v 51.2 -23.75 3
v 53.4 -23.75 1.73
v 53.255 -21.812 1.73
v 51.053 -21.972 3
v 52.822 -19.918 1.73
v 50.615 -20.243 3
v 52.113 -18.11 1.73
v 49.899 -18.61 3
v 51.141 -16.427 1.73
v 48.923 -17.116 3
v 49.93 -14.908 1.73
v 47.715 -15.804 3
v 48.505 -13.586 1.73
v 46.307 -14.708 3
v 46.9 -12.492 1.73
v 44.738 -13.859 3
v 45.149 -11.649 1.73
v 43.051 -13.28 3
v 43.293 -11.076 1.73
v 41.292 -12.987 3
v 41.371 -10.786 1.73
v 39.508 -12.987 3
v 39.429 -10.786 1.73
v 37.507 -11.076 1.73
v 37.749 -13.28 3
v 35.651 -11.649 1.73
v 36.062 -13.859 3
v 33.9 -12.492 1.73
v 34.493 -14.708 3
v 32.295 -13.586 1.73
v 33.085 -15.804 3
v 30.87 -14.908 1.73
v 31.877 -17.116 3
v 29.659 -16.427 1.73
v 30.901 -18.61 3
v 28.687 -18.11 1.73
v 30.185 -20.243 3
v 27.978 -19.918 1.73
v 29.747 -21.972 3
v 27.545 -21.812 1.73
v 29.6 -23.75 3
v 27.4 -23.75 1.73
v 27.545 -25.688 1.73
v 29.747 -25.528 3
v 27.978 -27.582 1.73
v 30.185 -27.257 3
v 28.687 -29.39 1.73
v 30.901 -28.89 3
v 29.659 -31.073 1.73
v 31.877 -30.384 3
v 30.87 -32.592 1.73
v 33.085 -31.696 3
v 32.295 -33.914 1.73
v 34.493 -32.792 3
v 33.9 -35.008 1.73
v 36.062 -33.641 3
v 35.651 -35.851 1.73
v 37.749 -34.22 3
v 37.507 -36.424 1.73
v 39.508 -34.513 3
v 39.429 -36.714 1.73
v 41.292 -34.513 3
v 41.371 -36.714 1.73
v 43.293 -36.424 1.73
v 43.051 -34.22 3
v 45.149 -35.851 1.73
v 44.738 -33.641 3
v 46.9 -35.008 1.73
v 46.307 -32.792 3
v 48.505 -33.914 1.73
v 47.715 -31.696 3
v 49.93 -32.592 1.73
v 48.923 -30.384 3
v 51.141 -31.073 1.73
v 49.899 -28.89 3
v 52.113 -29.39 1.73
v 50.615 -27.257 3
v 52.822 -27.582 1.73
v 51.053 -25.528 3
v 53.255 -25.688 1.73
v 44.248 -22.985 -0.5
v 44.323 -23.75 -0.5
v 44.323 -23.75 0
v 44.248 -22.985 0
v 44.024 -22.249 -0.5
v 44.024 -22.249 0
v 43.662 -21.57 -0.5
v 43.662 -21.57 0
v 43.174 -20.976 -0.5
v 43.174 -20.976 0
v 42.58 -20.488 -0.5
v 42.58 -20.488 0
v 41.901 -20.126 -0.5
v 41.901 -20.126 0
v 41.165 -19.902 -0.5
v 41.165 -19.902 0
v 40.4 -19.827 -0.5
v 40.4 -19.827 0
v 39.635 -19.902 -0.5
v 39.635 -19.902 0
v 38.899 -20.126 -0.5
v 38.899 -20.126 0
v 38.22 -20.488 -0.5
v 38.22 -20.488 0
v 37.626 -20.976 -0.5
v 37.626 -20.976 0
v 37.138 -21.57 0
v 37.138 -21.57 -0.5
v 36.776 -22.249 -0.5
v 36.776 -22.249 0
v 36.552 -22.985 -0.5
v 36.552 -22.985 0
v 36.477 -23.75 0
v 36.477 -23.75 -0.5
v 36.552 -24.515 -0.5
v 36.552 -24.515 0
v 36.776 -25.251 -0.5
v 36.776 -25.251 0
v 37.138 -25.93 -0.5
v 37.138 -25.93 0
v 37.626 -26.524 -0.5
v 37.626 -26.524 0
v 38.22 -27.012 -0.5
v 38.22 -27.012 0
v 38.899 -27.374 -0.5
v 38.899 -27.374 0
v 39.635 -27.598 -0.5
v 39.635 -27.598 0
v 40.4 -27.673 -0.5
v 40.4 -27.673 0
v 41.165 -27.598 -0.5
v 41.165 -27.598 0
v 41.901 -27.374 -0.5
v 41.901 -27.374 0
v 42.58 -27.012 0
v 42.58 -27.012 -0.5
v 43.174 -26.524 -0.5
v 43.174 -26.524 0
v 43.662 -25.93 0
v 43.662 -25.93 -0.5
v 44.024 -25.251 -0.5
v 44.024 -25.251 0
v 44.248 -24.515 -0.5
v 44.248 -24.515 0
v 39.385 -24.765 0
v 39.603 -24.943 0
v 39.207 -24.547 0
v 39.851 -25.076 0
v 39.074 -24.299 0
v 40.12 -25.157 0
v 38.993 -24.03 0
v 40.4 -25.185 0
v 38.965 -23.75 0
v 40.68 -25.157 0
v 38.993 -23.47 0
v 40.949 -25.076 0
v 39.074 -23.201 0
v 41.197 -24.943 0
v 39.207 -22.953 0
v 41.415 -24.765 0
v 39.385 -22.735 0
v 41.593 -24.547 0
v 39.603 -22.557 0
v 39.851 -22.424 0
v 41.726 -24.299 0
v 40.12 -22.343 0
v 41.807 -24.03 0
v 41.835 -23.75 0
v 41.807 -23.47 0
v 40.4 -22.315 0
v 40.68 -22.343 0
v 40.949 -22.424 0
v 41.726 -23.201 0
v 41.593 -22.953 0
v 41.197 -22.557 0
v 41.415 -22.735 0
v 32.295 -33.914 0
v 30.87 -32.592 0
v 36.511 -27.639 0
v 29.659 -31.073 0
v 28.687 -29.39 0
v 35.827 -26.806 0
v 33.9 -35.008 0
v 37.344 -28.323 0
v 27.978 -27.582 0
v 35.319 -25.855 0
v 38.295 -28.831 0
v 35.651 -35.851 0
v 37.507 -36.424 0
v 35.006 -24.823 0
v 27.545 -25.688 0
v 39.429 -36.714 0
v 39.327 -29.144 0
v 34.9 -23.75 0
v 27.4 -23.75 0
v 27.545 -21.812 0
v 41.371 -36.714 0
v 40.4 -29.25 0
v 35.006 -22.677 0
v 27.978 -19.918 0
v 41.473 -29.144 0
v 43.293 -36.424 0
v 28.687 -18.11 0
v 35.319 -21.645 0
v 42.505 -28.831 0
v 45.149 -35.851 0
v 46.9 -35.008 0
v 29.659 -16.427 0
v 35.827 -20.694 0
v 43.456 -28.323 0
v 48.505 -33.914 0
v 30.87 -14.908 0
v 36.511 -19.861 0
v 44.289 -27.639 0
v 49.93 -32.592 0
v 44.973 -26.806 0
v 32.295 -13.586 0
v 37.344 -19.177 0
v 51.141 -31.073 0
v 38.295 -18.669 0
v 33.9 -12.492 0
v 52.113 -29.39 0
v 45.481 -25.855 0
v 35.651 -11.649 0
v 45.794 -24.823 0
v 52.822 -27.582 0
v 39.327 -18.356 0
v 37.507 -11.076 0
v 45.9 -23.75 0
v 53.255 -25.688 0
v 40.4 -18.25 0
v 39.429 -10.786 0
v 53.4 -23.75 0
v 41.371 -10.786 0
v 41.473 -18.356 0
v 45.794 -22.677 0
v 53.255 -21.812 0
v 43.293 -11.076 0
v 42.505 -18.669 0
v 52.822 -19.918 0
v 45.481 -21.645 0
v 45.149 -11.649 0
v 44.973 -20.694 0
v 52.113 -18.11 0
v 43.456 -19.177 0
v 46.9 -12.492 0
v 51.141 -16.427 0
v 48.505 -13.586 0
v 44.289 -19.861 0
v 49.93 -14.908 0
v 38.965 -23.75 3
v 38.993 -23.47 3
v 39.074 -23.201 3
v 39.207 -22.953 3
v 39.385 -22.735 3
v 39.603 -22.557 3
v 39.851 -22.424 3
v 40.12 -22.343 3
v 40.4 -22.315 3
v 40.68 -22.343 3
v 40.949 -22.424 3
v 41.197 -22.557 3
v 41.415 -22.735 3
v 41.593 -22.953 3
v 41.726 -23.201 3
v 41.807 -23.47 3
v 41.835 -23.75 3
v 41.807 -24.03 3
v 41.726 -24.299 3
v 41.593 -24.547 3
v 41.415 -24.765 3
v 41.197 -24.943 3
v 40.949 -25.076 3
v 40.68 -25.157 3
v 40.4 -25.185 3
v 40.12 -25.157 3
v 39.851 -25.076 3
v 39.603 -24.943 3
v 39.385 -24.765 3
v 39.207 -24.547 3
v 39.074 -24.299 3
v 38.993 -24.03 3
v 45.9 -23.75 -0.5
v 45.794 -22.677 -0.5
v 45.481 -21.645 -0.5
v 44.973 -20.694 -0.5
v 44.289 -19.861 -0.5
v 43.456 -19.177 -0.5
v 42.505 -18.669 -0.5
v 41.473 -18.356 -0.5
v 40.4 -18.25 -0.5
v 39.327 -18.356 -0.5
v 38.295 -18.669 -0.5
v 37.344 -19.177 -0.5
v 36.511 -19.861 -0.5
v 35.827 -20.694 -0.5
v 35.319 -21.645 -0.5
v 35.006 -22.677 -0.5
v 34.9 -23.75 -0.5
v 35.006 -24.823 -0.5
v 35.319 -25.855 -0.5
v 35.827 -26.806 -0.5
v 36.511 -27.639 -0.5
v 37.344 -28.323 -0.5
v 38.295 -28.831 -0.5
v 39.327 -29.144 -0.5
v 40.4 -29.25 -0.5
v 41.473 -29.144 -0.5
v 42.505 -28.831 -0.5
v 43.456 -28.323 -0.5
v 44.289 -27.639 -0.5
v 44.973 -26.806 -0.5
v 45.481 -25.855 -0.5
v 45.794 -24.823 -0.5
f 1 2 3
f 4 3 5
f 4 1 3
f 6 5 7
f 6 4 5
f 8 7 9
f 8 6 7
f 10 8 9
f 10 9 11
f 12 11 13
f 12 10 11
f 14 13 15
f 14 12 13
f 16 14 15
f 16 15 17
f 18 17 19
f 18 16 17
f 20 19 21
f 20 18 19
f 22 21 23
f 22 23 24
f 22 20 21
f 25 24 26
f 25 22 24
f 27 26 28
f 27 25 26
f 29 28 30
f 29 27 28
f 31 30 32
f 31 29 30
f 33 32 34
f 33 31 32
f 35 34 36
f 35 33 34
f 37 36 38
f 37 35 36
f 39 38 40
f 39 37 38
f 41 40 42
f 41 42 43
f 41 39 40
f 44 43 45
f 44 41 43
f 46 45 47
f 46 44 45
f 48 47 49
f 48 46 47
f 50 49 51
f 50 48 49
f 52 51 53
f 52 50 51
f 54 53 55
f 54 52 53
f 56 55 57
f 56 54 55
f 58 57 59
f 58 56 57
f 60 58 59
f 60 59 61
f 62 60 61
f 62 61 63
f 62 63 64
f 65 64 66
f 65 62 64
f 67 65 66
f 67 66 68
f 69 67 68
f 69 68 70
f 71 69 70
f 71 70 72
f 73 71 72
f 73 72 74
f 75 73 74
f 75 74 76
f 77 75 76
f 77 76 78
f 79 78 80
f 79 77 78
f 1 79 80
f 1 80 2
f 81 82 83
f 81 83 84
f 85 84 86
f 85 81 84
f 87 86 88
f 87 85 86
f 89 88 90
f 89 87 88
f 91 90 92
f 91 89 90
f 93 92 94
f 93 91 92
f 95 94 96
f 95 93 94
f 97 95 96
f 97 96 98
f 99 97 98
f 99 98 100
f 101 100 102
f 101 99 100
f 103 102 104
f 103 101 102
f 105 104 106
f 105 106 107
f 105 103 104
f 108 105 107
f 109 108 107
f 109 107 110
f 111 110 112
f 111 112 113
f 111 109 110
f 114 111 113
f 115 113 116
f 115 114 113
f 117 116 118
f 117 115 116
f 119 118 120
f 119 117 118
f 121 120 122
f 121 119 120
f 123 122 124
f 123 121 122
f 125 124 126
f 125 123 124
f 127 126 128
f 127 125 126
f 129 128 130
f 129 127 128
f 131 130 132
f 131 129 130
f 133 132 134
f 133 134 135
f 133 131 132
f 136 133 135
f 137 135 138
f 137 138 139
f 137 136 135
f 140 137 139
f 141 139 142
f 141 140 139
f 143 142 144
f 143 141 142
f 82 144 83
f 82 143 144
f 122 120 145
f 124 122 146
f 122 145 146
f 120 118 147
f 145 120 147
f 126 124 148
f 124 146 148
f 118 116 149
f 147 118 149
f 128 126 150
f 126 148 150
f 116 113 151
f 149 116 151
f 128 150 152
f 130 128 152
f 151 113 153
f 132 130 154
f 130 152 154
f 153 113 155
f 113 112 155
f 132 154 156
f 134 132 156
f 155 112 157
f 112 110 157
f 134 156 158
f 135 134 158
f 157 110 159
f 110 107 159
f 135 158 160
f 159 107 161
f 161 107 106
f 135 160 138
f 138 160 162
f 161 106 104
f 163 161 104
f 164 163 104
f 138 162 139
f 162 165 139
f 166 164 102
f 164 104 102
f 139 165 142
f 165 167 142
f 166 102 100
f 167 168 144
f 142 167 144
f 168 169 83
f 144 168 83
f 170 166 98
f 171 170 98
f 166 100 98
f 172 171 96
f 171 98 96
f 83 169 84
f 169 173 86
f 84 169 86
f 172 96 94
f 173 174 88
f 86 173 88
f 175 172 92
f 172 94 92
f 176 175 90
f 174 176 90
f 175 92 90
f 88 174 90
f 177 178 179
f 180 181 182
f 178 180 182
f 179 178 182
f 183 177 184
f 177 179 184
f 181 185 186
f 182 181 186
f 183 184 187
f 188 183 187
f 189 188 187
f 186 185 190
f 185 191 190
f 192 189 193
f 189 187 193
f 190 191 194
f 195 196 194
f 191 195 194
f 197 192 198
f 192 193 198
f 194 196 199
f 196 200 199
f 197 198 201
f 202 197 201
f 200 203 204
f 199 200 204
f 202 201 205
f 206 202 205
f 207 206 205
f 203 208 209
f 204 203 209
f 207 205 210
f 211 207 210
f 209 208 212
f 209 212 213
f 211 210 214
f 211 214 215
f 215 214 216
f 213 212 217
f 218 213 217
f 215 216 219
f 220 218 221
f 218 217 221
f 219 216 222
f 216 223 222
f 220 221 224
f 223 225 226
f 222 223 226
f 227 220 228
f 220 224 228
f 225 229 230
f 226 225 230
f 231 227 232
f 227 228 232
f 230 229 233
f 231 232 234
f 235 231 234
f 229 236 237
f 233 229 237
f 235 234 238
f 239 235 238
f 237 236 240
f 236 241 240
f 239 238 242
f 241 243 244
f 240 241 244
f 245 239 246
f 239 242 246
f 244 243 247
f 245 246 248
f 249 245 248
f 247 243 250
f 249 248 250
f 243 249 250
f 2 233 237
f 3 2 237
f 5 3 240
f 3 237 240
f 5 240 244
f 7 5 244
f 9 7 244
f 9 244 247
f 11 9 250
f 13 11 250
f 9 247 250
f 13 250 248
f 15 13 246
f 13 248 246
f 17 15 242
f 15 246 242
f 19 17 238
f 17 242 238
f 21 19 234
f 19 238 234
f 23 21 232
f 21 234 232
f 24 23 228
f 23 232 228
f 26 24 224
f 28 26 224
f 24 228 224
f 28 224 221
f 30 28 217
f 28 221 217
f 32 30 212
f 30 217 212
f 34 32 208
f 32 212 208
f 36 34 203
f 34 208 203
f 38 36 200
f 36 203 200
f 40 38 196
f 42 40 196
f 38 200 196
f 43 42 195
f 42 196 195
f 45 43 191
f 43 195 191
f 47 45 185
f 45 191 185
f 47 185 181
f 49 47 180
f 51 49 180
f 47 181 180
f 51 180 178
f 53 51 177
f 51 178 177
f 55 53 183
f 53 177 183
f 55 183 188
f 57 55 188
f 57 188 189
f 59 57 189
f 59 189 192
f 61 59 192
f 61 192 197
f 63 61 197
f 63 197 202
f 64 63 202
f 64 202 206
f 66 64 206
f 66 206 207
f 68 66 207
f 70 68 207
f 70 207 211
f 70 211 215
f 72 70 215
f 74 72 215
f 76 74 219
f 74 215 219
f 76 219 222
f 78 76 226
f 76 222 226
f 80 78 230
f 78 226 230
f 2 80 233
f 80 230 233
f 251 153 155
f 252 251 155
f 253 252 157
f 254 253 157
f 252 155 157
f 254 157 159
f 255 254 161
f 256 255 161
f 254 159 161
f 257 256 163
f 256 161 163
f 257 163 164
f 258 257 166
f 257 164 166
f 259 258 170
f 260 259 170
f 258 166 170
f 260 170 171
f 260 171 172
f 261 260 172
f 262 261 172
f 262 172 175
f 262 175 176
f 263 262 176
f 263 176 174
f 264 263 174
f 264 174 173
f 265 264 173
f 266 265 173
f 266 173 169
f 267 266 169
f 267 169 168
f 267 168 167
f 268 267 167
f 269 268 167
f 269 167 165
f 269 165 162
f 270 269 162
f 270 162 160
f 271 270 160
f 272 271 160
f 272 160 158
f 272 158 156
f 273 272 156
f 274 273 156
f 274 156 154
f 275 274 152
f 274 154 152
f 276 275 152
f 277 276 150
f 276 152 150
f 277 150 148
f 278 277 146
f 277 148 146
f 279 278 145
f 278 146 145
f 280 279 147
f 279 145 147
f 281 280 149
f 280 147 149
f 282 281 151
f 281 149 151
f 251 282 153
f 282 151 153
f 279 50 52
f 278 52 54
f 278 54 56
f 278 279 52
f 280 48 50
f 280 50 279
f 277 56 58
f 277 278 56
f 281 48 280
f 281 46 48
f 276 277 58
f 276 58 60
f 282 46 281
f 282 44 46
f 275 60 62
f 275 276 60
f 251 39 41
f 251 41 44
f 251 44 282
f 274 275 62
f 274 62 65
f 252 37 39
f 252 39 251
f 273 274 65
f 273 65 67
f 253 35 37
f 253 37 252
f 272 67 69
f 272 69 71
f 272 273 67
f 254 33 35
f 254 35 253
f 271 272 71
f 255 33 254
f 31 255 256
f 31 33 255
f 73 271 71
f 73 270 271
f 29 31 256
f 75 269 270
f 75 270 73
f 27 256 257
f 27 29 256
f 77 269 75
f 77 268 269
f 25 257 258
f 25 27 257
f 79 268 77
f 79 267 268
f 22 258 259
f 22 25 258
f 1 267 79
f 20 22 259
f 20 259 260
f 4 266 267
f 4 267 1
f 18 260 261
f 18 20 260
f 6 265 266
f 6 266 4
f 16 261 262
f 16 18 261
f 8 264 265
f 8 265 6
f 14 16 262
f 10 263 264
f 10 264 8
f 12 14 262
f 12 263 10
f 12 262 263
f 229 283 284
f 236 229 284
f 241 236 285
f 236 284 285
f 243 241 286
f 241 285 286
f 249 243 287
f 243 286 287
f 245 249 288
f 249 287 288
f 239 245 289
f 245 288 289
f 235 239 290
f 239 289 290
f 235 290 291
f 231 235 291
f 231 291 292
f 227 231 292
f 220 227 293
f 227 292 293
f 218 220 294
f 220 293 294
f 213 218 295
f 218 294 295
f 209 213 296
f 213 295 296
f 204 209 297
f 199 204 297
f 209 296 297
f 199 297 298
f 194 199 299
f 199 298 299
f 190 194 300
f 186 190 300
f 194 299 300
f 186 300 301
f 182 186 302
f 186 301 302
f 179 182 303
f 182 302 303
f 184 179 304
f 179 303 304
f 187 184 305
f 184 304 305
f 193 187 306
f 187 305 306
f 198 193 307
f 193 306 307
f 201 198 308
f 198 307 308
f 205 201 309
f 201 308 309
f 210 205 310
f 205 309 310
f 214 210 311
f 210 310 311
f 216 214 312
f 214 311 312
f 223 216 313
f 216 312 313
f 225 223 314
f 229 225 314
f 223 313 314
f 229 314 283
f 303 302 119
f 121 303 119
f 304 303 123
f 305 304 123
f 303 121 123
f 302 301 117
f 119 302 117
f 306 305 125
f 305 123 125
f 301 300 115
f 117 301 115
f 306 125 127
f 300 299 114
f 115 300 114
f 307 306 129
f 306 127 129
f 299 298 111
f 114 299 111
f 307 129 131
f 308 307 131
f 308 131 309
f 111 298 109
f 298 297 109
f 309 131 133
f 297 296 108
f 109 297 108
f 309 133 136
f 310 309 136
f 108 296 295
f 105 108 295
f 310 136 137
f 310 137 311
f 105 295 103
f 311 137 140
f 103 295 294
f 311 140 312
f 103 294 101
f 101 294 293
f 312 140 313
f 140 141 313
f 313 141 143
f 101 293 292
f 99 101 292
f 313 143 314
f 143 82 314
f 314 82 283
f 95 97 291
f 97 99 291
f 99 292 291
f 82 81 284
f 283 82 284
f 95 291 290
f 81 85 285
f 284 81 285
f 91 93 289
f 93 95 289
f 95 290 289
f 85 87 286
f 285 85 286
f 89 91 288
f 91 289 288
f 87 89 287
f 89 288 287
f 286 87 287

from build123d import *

# Parameters (mm, degrees)
SKETCH2_R           = 5.5
SKETCH2_R_2         = 3.923
BOSS_EXTRUDE1_DEPTH = 0.5
SKETCH3_R           = 13
SKETCH3_R_2         = 5.5
SKETCH3_R_3         = 3.923
BOSS_EXTRUDE2_DEPTH = 3
SKETCH4_R           = 1.435
CUT_EXTRUDE1_DEPTH  = 65.893162175
CHAMFER1_SIZE       = 1.27
CHAMFER1_SIZE2      = 2.199704526


with BuildPart() as part:
    # Sketch2 → Boss-Extrude1 (new body)
    with BuildSketch(Plane.XY.offset(-0.5)):
        with Locations((40.399999972, -23.75)):
            Circle(SKETCH2_R)
        with Locations((40.399999972, -23.75)):
            Circle(SKETCH2_R_2, mode=Mode.SUBTRACT)
    extrude(amount=BOSS_EXTRUDE1_DEPTH)

    # Sketch3 → Boss-Extrude2 (add)
    with BuildSketch(Plane.XY):
        with Locations((40.399999972, -23.75)):
            Circle(SKETCH3_R)
        with Locations((40.399999972, -23.75)):
            Circle(SKETCH3_R_2, mode=Mode.SUBTRACT)
        with Locations((40.399999972, -23.75)):
            Circle(SKETCH3_R_2)
        with Locations((40.399999972, -23.75)):
            Circle(SKETCH3_R_3, mode=Mode.SUBTRACT)
        with Locations((40.399999972, -23.75)):
            Circle(SKETCH3_R_3)
    extrude(amount=BOSS_EXTRUDE2_DEPTH)

    # Sketch4 → Cut-Extrude1 (cut, through all)
    with BuildSketch(Plane(origin=(0, 0, 0), x_dir=(-1, 0, 0), z_dir=(0, 0, -1))):
        with Locations((-40.399999972, -23.75)):
            Circle(SKETCH4_R)
    extrude(amount=-CUT_EXTRUDE1_DEPTH, mode=Mode.SUBTRACT)

    # Chamfer1
    chamfer1_edges = [part.edges().sort_by_distance(p)[0] for p in [
        (27.399999972, -23.75, 3),
    ]]
    chamfer1_side = [part.faces().sort_by_distance(p)[0] for p in [
        (27.399999972, -23.75, 1.5),
    ]]
    chamfer(chamfer1_edges, length=CHAMFER1_SIZE, length2=CHAMFER1_SIZE2, reference=chamfer1_side[0])


solid = part.part
